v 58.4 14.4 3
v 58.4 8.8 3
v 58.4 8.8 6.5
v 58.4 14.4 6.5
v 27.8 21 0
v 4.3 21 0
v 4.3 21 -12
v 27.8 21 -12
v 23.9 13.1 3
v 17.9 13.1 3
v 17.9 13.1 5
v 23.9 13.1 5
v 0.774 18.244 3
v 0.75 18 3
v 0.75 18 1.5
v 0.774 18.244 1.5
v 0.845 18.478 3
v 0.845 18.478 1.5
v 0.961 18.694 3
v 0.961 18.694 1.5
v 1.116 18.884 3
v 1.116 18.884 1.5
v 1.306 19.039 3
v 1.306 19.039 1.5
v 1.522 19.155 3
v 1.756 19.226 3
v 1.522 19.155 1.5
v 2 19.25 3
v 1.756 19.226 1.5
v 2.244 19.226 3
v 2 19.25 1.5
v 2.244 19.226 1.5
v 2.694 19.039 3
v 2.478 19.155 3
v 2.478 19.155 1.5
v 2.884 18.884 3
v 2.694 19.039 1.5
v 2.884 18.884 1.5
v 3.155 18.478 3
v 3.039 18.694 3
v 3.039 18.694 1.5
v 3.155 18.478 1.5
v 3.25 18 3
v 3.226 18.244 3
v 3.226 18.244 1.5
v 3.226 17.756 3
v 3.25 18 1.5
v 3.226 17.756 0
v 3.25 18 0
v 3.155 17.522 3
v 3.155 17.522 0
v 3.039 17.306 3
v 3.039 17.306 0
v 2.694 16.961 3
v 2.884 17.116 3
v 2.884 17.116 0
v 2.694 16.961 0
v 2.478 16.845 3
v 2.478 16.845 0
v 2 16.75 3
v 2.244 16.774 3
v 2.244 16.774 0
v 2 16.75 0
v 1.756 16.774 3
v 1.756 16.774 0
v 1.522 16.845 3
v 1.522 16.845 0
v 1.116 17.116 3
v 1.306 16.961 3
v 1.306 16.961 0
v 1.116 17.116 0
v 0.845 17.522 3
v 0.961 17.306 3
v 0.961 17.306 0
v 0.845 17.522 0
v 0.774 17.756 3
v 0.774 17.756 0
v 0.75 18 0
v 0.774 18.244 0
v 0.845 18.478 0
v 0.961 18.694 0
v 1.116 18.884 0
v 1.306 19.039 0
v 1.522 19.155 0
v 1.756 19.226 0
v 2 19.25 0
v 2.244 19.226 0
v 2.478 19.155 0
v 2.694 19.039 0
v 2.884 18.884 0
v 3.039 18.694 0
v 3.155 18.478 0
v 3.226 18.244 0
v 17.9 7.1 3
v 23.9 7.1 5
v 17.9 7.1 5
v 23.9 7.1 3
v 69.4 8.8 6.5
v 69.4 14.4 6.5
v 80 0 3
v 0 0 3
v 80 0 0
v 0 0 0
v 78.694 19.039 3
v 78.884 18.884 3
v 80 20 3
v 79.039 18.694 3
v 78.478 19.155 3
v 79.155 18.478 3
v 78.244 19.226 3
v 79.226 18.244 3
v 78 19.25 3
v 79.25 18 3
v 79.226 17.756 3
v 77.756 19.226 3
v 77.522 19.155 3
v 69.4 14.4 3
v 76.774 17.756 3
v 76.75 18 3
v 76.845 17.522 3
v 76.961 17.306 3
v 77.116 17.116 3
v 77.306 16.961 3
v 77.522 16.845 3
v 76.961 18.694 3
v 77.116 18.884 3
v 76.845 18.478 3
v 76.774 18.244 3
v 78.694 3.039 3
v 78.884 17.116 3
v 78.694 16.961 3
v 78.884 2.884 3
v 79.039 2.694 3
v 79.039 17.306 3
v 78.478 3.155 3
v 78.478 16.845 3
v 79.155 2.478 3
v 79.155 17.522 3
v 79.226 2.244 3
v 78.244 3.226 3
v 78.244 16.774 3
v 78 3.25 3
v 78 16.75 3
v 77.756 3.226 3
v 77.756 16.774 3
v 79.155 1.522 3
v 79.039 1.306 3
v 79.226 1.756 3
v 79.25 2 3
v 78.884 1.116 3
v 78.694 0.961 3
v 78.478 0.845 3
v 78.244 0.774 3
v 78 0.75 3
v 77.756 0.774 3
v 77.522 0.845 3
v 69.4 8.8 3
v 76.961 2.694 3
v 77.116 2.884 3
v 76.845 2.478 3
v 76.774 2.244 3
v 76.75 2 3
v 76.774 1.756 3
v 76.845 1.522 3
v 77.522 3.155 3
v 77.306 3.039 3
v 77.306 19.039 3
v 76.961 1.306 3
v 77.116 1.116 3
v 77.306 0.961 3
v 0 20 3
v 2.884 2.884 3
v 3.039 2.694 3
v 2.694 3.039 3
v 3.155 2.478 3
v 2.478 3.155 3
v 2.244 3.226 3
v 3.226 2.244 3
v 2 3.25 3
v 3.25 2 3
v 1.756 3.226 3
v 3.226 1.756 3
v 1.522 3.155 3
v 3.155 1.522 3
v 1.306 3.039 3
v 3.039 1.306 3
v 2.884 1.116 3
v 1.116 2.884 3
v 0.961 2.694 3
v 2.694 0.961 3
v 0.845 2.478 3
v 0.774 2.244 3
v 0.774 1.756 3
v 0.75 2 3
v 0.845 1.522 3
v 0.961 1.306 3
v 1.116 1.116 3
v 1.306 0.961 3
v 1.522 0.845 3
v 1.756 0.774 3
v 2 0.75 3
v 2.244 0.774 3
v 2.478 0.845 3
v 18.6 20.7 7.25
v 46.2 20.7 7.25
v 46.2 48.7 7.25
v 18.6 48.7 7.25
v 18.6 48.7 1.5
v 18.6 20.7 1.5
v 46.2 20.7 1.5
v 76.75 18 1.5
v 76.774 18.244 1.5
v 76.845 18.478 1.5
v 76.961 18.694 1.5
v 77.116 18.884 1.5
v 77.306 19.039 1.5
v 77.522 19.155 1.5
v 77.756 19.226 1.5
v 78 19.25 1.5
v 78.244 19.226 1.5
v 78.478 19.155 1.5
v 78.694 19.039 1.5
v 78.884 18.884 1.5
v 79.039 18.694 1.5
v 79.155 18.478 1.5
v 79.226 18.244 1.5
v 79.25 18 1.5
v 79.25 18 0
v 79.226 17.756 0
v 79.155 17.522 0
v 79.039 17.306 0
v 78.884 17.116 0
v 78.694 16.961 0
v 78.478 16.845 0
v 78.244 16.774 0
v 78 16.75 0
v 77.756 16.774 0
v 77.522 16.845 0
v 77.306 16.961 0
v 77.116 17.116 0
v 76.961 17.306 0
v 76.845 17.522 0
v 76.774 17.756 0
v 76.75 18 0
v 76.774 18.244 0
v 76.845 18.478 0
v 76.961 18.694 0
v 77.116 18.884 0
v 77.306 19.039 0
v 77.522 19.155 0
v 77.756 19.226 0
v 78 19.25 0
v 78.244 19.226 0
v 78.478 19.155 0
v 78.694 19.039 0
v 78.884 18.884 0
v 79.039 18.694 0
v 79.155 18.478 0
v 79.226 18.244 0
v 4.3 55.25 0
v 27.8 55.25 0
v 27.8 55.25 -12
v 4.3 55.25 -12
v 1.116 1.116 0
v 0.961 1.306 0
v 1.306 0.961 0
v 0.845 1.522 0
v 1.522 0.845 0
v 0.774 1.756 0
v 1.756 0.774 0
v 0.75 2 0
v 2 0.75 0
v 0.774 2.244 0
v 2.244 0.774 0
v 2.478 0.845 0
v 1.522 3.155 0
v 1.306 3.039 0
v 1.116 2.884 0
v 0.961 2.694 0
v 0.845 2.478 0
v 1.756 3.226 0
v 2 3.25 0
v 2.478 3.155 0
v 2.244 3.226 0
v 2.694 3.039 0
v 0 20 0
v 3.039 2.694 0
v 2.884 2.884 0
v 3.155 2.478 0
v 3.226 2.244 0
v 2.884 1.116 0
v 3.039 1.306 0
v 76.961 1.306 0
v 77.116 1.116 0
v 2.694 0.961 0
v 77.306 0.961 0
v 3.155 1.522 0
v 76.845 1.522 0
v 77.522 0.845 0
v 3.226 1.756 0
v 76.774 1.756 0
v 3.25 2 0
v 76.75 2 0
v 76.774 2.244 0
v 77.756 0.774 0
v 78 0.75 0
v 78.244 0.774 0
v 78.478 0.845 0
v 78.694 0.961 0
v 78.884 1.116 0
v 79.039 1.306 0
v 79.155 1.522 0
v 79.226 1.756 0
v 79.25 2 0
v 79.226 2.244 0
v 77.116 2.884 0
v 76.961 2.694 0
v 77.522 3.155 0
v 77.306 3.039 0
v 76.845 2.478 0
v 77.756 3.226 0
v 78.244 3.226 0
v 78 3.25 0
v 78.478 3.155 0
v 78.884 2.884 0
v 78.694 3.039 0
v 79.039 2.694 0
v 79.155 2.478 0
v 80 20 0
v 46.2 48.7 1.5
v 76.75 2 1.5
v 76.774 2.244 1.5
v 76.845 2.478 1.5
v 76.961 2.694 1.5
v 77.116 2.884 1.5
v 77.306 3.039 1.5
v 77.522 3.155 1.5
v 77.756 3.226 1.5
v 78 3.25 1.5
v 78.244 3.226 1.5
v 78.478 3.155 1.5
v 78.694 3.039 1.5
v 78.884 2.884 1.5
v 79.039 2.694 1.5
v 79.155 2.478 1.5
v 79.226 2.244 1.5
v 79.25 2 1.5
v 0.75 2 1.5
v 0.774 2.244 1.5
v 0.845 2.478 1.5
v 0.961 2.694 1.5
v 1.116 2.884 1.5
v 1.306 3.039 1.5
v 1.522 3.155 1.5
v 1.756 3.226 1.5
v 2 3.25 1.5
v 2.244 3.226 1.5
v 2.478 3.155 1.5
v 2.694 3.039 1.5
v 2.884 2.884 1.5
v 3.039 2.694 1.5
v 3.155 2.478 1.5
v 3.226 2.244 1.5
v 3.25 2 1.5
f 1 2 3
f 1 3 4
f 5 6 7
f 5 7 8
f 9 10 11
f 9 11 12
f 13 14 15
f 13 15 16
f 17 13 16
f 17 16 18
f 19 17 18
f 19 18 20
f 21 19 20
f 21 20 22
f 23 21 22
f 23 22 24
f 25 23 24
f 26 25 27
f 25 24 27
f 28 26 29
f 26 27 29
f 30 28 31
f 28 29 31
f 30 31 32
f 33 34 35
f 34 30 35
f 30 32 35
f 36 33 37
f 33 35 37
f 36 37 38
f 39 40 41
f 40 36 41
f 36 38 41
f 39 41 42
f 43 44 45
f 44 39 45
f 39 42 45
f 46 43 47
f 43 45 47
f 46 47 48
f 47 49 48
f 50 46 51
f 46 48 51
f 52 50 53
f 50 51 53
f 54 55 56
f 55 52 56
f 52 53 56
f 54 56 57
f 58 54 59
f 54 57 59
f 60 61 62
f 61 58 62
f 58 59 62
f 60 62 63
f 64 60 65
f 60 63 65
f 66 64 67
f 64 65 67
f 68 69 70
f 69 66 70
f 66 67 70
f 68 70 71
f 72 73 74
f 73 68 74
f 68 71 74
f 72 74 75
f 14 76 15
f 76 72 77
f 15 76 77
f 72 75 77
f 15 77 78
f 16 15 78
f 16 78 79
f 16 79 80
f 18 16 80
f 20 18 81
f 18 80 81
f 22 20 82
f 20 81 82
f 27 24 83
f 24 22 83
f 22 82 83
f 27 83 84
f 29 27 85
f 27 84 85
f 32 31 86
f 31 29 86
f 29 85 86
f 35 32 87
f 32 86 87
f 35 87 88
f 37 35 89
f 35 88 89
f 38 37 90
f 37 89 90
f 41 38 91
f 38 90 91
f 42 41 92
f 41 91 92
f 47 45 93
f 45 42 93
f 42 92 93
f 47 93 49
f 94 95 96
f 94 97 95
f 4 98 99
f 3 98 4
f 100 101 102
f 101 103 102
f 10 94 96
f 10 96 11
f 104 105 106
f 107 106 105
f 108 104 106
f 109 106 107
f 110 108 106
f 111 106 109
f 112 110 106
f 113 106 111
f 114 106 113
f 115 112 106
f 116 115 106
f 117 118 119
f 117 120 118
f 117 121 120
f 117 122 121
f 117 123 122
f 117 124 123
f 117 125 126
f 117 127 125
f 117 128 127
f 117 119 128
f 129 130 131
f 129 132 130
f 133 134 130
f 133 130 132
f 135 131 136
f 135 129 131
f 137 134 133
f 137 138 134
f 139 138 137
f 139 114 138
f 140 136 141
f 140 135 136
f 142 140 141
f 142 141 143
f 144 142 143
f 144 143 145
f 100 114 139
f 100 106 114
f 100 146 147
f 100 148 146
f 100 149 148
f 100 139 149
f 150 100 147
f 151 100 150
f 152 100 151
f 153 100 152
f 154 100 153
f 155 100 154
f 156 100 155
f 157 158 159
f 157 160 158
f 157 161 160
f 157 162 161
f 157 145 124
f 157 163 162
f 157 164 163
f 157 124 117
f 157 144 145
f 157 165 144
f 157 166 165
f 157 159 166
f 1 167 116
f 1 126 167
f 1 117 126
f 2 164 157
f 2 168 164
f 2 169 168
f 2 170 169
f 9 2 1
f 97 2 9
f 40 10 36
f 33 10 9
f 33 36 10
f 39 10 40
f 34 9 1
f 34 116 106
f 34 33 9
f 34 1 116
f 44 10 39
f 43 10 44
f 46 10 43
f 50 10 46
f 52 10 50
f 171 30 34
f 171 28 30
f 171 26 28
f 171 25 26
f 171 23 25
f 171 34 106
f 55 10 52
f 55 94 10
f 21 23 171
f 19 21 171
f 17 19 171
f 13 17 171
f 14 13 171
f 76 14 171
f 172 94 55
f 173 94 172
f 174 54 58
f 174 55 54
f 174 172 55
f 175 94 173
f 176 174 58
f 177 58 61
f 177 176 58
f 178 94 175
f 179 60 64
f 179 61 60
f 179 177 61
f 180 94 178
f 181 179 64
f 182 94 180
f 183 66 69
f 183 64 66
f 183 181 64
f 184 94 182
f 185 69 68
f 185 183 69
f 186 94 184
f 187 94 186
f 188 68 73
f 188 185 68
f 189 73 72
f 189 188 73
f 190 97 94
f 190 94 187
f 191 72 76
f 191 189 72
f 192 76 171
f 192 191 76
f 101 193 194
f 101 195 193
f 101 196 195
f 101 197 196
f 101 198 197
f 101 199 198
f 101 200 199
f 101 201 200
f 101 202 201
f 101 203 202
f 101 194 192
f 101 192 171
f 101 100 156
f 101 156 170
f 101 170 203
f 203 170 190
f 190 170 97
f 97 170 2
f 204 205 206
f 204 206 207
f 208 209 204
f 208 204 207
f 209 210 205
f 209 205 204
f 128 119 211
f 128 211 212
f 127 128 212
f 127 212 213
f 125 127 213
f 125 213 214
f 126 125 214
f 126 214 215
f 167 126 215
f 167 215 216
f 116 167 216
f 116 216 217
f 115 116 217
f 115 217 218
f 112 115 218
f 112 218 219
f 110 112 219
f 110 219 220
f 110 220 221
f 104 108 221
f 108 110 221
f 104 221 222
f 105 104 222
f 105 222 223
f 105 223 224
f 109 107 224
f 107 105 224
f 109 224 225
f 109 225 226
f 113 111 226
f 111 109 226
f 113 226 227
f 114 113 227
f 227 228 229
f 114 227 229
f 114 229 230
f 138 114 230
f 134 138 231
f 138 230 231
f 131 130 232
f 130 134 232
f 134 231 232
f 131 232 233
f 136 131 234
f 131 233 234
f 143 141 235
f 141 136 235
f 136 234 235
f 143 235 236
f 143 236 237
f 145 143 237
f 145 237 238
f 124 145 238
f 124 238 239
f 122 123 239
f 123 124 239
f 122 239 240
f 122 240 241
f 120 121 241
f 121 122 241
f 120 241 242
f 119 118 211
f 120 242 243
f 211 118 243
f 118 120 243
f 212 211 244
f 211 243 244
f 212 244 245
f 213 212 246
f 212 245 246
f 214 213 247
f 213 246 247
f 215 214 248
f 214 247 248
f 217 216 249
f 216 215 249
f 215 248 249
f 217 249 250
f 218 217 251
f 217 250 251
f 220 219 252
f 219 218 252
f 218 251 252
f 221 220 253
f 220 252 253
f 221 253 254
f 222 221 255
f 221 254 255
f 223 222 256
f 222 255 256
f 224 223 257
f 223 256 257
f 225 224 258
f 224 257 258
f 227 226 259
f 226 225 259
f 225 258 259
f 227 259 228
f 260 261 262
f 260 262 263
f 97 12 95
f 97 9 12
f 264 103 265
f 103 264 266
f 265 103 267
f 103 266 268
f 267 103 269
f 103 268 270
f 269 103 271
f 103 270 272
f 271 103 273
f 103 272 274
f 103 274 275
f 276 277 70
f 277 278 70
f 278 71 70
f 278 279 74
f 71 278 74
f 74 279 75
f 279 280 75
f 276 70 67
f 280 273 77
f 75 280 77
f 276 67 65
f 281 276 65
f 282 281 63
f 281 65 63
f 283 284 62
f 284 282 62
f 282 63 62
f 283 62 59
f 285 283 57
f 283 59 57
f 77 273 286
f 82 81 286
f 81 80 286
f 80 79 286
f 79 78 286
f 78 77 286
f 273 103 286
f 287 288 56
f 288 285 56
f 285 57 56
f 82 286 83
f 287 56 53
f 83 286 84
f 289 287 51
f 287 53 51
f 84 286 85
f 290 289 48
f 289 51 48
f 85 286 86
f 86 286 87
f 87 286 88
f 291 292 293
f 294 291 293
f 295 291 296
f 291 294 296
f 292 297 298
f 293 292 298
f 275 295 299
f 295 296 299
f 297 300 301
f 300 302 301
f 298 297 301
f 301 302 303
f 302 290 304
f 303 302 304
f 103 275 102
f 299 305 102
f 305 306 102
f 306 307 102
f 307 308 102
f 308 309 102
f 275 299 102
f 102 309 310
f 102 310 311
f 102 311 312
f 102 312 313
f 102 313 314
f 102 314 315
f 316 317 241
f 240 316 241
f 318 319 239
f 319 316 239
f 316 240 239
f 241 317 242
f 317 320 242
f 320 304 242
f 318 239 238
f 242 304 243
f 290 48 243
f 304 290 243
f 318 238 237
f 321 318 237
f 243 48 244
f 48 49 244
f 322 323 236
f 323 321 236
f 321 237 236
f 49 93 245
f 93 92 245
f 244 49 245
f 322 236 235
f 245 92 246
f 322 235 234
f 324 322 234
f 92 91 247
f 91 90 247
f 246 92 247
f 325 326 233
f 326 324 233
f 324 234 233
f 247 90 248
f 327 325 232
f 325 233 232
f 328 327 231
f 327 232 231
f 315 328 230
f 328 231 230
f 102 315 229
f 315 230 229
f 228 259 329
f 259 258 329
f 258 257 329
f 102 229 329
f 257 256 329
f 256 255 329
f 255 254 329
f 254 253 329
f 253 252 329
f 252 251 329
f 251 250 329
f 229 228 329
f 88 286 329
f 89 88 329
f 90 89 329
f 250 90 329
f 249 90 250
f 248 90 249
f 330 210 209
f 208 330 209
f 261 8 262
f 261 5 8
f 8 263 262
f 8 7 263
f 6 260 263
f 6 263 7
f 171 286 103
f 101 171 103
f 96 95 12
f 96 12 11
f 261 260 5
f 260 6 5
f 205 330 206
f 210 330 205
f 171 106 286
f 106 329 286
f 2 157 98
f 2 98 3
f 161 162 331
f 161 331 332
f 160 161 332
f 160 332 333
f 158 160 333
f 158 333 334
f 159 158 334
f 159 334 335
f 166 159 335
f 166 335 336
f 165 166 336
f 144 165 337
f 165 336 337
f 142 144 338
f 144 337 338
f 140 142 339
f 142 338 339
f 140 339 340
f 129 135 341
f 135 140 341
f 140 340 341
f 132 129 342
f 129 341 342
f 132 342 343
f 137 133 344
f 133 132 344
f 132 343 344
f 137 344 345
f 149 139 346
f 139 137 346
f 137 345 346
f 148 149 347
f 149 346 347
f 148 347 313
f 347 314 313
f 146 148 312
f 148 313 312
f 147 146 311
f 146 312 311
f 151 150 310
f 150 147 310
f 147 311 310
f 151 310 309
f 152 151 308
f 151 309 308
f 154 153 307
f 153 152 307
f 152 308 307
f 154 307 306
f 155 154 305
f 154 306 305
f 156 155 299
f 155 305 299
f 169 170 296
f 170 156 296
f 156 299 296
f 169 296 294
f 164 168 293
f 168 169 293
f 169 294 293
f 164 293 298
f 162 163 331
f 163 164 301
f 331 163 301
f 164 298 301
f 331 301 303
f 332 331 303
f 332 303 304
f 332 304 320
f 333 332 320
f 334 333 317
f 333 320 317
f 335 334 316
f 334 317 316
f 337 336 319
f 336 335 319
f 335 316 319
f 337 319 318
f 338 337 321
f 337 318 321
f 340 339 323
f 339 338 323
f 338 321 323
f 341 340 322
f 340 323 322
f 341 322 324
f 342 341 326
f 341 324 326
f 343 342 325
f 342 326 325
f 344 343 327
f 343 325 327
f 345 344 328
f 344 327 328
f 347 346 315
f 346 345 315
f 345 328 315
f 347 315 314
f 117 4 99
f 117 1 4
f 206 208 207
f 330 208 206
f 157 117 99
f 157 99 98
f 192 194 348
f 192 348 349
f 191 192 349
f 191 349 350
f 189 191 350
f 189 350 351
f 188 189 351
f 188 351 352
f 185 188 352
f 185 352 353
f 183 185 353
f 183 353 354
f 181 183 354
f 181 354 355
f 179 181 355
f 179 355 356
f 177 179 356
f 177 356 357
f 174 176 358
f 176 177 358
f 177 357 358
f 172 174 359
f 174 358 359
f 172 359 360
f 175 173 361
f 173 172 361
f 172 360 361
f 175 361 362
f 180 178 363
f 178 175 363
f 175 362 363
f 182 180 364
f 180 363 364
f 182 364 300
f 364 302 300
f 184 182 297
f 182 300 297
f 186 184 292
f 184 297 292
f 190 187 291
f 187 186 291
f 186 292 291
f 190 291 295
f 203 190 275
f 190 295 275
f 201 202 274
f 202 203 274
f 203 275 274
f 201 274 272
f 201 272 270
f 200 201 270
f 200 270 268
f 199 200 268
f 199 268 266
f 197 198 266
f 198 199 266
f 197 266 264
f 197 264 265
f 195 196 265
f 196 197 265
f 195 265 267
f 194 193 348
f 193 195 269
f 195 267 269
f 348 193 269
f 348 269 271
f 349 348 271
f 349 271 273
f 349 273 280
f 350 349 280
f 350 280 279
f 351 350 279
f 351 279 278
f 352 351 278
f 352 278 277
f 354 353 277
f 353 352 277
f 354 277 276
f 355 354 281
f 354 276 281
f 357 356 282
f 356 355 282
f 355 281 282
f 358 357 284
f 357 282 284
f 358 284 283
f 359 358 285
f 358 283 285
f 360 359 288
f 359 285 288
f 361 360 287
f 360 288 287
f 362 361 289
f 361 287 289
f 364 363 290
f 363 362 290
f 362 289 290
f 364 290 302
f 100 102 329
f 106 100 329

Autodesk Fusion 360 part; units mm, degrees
sketch "Sketch2" plane through (0, 0, 0) normal (0, 0, 1) x (1, 0, 0)
  line L0 (0, 0) -> (70, 0)
  line L1 (70, 0) -> (70, 50)
  line L2 (70, 50) -> (0, 50)
  line L3 (0, 50) -> (0, 0)
  dimension "d1" = 70
  dimension "d2" = 50
extrude "Extrude1" add sketch "Sketch2" along normal blind 1.5
sketch "Sketch3" plane through (0, 0, 1.5) normal (0, 0, 1) x (-1, 0, 0)
  line L0 (0, -50) -> (0, 0)
  line L1 (0, 0) -> (-70, 0)
  line L2 (-70, 0) -> (-70, -50)
  line L3 (-70, -50) -> (0, -50)
  line L4 (-18.6, -48.7) -> (-46.2, -48.7)
  line L5 (-46.2, -48.7) -> (-46.2, -20.7)
  line L6 (-46.2, -20.7) -> (-18.6, -20.7)
  line L7 (-18.6, -20.7) -> (-18.6, -48.7)
  line L8 (-28, -48.7) -> (-28, -50) construction
  line L9 (-18.6, -42) -> (0, -42) construction
  dimension "d5" = 27.6
  dimension "d6" = 28
  dimension "d7" = 1.3
  dimension "d8" = 18.6
extrude "Extrude2" add sketch "Sketch3" along normal blind 5.75 contours L4 L5 L6 L7
sketch "Sketch4" plane through (0, 0, 0) normal (0, 0, -1) x (1, 0, 0)
  line L0 (0, 0) -> (0, -50)
  line L1 (0, -50) -> (70, -50)
  line L2 (70, -50) -> (70, 0)
  line L3 (70, 0) -> (0, 0)
  line L4 (4.3, -21) -> (27.8, -21)
  line L5 (27.8, -21) -> (27.8, -55.25)
  line L6 (27.8, -55.25) -> (4.3, -55.25)
  line L7 (4.3, -55.25) -> (4.3, -21)
  dimension "d11" = 23.5
  dimension "d12" = 34.25
  dimension "d17" = 5.25
  dimension "d18" = 4.3
extrude "Extrude3" add sketch "Sketch4" along normal blind 12 contours L1 L4 L5 L7 | L1 L5 L6 L7
sketch "Sketch5" plane through (0, 0, 1.5) normal (0, 0, 1) x (-1, 0, 0)
  line L0 (-18.6, -20.7) -> (-18.6, -48.7)
  line L1 (-18.6, -48.7) -> (-46.2, -48.7)
  line L2 (-46.2, -48.7) -> (-46.2, -20.7)
  line L3 (-46.2, -20.7) -> (-18.6, -20.7)
  line L4 (0, -50) -> (0, 0)
  line L5 (0, 0) -> (-70, 0)
  line L6 (-70, 0) -> (-70, -50)
  line L7 (-70, -50) -> (0, -50)
  line L8 (-2, -50) -> (-2, -48) construction
  line L9 (0, -48) -> (-2, -48) construction
  circle A0 centre (-2, -48) radius 1.25
  line L10 (-2, 0) -> (-2, -2) construction
  line L11 (0, -2) -> (-2, -2) construction
  circle A1 centre (-2, -2) radius 1.25
  line L12 (-70, -2) -> (-68, -2) construction
  line L13 (-68, -2) -> (-68, 0) construction
  circle A2 centre (-68, -2) radius 1.25
  line L14 (-68, -50) -> (-68, -48) construction
  line L15 (-68, -48) -> (-70, -48) construction
  circle A3 centre (-68, -48) radius 1.25
  dimension "d21" = 2
  dimension "d22" = 2
  dimension "d23" = 2.5
  dimension "d24" = 2
  dimension "d25" = 2
  dimension "d26" = 2.5
  dimension "d27" = 2
  dimension "d28" = 2
  dimension "d29" = 2.5
  dimension "d30" = 2
  dimension "d31" = 2
  dimension "d32" = 2.5
extrude "Extrude4" cut sketch "Sketch5" against normal up to surface (1.5 mm away) contours A0 | A1 | A2 | A3

Autodesk Fusion 360 part; units mm, degrees
sketch "Sketch1" plane through (0, 0, 0) normal (0, 0, 1) x (1, 0, 0)
  line L0 (0, 0) -> (80, 0)
  line L1 (80, 0) -> (80, 20)
  line L2 (80, 20) -> (0, 20)
  line L3 (0, 20) -> (0, 0)
  line L4 (2, 20) -> (2, 18) construction
  line L5 (0, 18) -> (2, 18) construction
  circle A0 centre (2, 18) radius 1.25
  line L6 (78, 20) -> (78, 18) construction
  line L7 (80, 17.9933) -> (78, 18) construction
  circle A1 centre (78, 18) radius 1.25
  line L8 (80, 2) -> (78, 2) construction
  line L9 (78, 0) -> (78, 2) construction
  circle A2 centre (78, 2) radius 1.25
  line L10 (0, 2) -> (2, 2) construction
  line L11 (2, 0) -> (2, 2) construction
  circle A3 centre (2, 2) radius 1.25
  dimension "d1" = 80
  dimension "d2" = 20
  dimension "d5" = 2
  dimension "d6" = 2
  dimension "d7" = 2.5
  dimension "d8" = 2
  dimension "d9" = 2
  dimension "d10" = 2.5
  dimension "d13" = 2
  dimension "d14" = 2
  dimension "d15" = 2.5
  dimension "d16" = 2
  dimension "d17" = 2
  dimension "d18" = 2.5
extrude "Extrude2" add sketch "Sketch1" along normal blind 1.5
sketch "Sketch2" plane through (0, 0, 1.5) normal (0, 0, 1) x (-1, 0, 0)
  circle A0 centre (-2, -18) radius 1.25
  circle A1 centre (-78, -2) radius 1.25
  circle A2 centre (-78, -18) radius 1.25
  circle A3 centre (-2, -2) radius 1.25
  line L0 (0, -20) -> (0, 0)
  line L1 (0, 0) -> (-80, 0)
  line L2 (-80, 0) -> (-80, -20)
  line L3 (-80, -20) -> (0, -20)
  line L4 (-17.9, -13.1) -> (-23.9, -13.1)
  line L5 (-23.9, -13.1) -> (-23.9, -7.1)
  line L6 (-23.9, -7.1) -> (-17.9, -7.1)
  line L7 (-17.9, -7.1) -> (-17.9, -13.1)
  line L8 (-20.9, -20) -> (-20.9, -13.1) construction
  line L9 (0, -11) -> (-17.9, -11) construction
  line L10 (-58.4, -14.4) -> (-69.4, -14.4)
  line L11 (-69.4, -14.4) -> (-69.4, -8.8)
  line L12 (-69.4, -8.8) -> (-58.4, -8.8)
  line L13 (-58.4, -8.8) -> (-58.4, -14.4)
  line L14 (-64.8436, -20) -> (-64.8436, -14.4) construction
  line L15 (-69.4, -11.6) -> (-80, -11.6) construction
  dimension "d21" = 6
  dimension "d22" = 6
  dimension "d23" = 6.9
  dimension "d26" = 17.9
  dimension "d27" = 11
  dimension "d28" = 5.6
  dimension "d29" = 5.6
  dimension "d30" = 10.6
extrude "Extrude3" add sketch "Sketch2" along normal blind 5 contours L10 L11 L12 L13
extrude "Extrude4" add sketch "Sketch2" along normal blind 3.5 contours L4 L5 L6 L7
